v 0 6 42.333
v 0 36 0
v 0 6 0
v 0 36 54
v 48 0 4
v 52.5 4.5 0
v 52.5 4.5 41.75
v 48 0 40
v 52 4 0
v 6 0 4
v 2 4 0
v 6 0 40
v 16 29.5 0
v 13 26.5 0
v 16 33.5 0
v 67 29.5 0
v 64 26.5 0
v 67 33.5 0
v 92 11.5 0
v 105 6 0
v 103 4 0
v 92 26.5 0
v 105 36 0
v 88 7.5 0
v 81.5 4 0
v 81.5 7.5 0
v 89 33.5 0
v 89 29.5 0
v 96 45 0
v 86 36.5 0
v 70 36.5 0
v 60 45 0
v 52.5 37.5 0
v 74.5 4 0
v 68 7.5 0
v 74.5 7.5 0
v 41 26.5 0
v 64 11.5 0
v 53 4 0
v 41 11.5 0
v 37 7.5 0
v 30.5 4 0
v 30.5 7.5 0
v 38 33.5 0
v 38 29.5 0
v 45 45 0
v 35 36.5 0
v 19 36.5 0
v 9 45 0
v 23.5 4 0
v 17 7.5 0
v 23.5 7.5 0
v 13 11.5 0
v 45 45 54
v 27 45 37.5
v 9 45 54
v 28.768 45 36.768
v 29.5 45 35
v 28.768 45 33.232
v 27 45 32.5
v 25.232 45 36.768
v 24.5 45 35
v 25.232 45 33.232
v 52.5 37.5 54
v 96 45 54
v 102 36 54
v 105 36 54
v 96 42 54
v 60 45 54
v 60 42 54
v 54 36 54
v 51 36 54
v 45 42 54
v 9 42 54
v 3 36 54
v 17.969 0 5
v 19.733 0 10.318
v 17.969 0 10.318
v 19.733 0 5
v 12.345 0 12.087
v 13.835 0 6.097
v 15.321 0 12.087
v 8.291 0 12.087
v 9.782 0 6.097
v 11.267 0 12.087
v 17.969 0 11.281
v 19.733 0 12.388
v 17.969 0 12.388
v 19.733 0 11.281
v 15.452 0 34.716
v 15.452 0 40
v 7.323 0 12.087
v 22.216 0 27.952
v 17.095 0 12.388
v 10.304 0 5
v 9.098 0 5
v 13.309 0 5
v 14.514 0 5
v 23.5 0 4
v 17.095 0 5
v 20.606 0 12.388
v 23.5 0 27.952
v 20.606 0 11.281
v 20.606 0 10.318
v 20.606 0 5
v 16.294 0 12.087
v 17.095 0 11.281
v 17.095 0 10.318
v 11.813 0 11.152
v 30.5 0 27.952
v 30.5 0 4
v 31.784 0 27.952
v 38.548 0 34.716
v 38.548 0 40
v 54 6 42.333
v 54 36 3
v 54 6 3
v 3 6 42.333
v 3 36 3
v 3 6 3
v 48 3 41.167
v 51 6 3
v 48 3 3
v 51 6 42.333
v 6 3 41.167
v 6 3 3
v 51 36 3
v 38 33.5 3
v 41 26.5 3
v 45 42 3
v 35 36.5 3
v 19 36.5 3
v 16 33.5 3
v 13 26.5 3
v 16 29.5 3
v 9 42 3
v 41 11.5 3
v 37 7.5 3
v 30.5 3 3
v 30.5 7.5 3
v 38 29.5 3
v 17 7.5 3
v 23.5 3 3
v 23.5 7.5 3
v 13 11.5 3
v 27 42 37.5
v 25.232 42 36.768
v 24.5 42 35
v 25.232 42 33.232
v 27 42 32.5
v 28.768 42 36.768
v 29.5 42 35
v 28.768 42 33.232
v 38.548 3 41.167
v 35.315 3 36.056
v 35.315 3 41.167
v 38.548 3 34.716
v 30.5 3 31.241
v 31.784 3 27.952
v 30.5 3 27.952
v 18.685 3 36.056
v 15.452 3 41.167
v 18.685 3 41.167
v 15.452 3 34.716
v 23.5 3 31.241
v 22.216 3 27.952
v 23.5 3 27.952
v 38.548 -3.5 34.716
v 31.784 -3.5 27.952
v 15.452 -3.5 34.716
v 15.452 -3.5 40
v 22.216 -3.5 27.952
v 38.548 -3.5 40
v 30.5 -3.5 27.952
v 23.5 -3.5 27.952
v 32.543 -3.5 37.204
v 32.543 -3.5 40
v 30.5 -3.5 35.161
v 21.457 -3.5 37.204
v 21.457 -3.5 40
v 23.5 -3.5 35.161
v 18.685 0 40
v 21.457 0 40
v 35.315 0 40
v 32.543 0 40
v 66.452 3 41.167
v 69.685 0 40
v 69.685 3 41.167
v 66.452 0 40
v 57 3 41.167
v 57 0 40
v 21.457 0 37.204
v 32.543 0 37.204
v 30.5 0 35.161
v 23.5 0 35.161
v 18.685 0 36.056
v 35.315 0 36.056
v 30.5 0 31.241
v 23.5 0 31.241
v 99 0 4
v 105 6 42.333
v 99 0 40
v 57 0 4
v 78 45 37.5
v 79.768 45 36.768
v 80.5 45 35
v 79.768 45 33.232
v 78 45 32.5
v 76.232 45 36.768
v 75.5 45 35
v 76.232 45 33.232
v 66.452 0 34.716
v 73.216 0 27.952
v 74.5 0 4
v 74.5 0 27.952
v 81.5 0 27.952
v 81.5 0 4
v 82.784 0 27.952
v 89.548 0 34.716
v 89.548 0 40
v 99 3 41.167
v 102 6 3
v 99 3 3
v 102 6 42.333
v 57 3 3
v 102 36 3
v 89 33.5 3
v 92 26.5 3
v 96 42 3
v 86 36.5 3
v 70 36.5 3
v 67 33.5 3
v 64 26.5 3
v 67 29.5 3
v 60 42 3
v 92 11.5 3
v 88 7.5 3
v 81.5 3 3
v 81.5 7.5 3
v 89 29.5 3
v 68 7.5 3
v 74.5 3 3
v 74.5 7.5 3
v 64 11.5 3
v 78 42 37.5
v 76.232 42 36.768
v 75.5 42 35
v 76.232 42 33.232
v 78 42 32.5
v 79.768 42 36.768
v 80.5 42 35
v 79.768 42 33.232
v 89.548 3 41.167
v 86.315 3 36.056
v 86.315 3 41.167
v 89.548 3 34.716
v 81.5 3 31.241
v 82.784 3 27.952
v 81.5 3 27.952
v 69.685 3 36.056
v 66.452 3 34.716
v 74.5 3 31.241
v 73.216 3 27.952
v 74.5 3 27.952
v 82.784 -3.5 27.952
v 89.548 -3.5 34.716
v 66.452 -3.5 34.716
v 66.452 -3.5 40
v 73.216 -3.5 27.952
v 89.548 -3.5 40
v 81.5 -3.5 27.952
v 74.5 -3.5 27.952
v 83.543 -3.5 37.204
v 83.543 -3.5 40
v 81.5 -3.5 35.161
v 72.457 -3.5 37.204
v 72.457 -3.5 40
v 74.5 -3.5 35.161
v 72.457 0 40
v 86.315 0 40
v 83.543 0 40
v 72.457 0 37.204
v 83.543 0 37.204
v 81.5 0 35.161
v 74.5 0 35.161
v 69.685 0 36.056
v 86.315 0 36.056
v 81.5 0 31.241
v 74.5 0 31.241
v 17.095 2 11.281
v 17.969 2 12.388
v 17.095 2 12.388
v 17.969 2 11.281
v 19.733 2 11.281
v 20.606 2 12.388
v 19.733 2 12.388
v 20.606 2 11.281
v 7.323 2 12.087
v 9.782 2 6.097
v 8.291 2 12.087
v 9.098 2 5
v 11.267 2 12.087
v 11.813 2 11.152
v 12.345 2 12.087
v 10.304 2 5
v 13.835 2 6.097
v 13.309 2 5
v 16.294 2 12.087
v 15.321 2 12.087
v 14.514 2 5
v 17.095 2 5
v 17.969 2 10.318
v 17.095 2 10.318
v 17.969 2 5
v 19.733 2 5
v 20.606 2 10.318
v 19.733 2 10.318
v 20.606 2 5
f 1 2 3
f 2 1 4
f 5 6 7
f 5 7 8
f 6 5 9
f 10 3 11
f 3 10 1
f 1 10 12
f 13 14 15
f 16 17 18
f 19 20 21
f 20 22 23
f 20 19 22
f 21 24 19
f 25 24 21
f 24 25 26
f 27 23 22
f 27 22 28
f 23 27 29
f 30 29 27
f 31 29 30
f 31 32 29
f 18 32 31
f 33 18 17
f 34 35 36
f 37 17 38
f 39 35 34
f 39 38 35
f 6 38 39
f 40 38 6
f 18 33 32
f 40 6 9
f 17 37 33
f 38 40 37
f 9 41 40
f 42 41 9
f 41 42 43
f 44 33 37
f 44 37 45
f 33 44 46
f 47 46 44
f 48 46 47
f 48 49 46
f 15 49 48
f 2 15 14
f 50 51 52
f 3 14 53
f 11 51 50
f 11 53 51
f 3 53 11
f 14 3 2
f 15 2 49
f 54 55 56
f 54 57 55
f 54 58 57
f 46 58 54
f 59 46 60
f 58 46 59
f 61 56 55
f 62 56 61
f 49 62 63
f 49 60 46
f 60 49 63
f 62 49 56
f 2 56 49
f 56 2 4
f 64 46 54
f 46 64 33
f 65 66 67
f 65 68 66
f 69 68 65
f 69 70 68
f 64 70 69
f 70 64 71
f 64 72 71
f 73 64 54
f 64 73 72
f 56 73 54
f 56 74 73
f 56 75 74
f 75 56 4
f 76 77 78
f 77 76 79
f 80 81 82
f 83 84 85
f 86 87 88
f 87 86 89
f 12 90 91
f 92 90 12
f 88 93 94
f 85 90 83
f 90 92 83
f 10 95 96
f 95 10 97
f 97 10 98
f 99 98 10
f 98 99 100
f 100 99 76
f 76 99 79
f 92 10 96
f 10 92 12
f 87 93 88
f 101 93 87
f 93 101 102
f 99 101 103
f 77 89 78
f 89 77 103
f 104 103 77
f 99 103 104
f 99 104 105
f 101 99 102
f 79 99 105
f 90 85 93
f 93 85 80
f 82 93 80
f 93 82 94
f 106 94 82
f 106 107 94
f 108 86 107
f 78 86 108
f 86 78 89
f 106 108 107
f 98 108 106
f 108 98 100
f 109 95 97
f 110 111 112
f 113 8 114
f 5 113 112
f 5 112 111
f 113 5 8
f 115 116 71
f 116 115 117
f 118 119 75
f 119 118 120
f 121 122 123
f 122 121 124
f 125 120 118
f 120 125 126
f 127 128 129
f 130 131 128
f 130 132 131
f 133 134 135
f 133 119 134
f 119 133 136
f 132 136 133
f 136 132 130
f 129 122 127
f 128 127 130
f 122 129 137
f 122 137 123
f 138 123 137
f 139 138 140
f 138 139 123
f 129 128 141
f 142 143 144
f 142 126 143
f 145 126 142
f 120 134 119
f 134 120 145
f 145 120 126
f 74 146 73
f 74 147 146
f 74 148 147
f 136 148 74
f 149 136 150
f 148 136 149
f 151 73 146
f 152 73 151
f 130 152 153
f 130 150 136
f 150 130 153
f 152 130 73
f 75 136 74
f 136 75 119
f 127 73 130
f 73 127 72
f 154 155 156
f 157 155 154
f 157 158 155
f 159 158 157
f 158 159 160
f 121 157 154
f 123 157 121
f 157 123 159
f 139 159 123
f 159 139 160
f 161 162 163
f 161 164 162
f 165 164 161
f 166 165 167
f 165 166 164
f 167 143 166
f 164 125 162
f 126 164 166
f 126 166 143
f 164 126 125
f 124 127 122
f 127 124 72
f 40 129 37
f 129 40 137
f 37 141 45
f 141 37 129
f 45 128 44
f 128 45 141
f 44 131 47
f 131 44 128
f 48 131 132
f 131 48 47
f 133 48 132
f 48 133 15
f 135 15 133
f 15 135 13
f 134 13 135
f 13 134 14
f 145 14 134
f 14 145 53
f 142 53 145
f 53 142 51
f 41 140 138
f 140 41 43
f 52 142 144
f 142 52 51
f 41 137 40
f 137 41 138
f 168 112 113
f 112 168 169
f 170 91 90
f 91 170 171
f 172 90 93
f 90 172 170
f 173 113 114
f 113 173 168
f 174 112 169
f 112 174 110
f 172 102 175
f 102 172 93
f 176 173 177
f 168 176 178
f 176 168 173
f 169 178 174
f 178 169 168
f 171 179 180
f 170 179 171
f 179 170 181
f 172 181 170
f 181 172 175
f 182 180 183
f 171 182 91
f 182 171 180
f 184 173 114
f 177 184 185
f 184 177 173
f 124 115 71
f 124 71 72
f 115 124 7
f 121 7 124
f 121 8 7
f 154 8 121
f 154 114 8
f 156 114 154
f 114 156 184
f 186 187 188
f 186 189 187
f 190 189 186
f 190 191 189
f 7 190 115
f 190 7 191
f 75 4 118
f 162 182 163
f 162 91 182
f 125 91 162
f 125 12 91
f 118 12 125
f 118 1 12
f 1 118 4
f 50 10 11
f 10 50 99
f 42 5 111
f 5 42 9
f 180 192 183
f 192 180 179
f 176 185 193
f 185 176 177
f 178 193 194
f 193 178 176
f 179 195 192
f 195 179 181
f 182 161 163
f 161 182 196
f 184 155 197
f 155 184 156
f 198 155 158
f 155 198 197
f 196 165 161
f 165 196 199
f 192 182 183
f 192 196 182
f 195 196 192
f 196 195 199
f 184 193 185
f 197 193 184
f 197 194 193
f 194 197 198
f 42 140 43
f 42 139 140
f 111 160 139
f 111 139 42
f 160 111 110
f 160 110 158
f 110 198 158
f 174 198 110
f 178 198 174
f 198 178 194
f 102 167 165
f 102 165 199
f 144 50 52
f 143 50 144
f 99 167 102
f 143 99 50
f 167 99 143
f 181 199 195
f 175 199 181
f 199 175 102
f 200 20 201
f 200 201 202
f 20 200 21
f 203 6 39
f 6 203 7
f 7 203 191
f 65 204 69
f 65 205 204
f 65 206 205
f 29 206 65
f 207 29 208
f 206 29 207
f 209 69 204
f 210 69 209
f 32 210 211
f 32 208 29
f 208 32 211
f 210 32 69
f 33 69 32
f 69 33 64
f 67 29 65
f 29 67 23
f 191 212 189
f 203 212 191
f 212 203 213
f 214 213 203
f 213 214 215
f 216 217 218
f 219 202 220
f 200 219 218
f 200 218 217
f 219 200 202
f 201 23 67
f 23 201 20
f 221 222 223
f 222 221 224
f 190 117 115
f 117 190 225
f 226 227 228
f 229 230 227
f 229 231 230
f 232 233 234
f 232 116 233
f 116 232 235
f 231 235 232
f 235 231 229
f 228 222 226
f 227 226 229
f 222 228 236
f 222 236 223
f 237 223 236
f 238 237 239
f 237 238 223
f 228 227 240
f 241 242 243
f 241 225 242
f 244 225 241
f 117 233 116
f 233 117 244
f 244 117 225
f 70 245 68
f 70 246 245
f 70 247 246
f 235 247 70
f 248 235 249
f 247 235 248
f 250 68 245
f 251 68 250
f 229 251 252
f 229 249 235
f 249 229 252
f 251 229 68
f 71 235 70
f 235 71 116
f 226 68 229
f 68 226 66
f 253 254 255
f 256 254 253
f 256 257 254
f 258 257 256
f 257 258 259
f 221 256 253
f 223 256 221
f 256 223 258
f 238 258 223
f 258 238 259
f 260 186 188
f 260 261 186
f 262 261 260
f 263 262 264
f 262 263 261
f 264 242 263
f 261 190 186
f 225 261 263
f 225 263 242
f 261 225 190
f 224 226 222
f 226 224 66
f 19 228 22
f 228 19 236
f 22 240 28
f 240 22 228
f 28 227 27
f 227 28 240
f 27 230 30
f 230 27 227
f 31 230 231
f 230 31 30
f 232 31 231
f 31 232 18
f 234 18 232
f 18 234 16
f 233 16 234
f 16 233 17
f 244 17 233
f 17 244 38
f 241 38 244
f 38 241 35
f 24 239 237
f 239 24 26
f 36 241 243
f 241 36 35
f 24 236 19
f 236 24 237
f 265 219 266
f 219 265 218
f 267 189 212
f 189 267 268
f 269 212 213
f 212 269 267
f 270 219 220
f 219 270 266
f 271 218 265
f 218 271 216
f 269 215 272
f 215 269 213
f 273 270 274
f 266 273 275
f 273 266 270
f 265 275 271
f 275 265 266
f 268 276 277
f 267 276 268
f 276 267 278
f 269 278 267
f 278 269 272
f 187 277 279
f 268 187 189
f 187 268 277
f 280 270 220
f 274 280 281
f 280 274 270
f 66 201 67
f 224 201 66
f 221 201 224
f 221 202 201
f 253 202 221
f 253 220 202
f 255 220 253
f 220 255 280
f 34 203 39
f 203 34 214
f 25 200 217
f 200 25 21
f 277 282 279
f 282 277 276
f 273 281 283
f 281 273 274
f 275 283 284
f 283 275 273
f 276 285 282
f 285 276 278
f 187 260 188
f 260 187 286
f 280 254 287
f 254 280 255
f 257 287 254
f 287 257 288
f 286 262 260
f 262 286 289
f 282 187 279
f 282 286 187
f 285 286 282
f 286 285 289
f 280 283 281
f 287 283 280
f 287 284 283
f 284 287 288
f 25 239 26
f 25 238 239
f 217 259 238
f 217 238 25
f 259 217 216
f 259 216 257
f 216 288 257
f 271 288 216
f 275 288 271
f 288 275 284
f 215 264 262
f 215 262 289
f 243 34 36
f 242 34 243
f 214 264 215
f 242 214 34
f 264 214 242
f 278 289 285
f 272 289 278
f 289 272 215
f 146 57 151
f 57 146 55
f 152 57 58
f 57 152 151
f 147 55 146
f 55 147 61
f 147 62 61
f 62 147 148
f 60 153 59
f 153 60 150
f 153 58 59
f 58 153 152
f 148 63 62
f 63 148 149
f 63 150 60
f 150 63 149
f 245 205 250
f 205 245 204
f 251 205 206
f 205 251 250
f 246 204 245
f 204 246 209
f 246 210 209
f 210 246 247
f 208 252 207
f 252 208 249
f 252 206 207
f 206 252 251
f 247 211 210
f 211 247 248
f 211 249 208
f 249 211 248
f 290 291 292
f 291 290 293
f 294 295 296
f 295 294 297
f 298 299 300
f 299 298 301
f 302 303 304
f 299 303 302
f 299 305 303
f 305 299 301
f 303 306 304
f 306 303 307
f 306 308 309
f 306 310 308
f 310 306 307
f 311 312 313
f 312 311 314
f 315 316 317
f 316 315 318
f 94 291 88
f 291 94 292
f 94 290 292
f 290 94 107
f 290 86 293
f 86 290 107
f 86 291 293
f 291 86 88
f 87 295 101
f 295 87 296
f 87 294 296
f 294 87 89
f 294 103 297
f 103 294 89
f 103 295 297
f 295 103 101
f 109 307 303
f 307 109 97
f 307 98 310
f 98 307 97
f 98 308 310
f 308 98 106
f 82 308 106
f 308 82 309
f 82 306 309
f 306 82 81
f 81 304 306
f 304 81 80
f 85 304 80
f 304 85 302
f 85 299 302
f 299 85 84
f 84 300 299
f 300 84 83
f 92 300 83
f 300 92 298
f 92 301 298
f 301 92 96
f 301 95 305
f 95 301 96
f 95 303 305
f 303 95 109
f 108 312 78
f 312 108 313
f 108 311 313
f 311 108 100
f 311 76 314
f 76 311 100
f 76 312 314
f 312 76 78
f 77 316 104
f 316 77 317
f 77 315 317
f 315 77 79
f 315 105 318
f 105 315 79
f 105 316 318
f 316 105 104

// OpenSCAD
// number of bins
n = 2;

/* [Hidden] */

a = 6;
b = 9;
w = 48;
h = 39;
m = 3;
z = 54; 
 
outer_points =[[0,a], [0,h+2*m-b], [b,h+2*m], [w+2*m-b,h+2*m], [w+2*m,h+2*m-b], [w+2*m,a], [w+2*m-a,0], [a,0]];
inner_points =[[m,a], [m,h+2*m-b], [b,h+m], [w+2*m-b,h+m], [w+m,h+2*m-b], [w+m,a], [w+2*m-a,m], [a,m]];
hole_points = [[-10,0], [-14,4], [-14,19], [-11,22], [-11,26], [-8, 29], [8,29], [11,26], [11,22], [14,19], [14,4], [10,0]];
profile_points = [[0,0], [0, 54], [b, 54], [h+2*m, 40], [h+2*m+5, 40], [h+2*m+5, 4+5], [h+2*m-4, 0]]; 
 
 module wiimote()
 { 

       difference()
        {
            // main
            linear_extrude(height = z) 
               polygon(outer_points);    
            // cavity
            translate([0, 0, m])
                linear_extrude(heigth = m)
                    polygon(inner_points);    
            // cable hole
            translate([m+(w/2),6.5+1,0]) 
               linear_extrude(heigth =m)
                 polygon(hole_points);
        }
    
 }

module nunchuk_positive()
{
    // nunchuck holder
    translate([ m+(w/2), m, 39.5])
      rotate([90,360/16, 0])
        cylinder(h=6.5, d=25, $fn=8);
} 

module nunchuk_negative()
{
    // nunchuck holder
    translate([ m+(w/2), 1+m, 39.5])
      rotate([90,360/16, 0])
        {
            cylinder(h=6.5+1, d=11+1, $fn=8);
            cylinder(h=m+1, d=17+1, $fn=8);
        }

} 


module bin()
{
  difference()
  {
      intersection()
      {
         translate ([w+2*m, h + 2*m, 0]) 
           rotate([90, 0, -90])       
             linear_extrude(heigth = w + 2*m)
               polygon(profile_points); 
          union()
            {
                wiimote();
                nunchuk_positive();
            }
      }
        
  // front entrance
  translate([m+(w/2)-(7/2), -5, 0])
    cube([7, 6.5+5+1, z]);
  nunchuk_negative();
  }
}


difference()
{
  for (i = [1:n])
    translate([(i-1)*(w+m), 0, 0]) bin();
  // hanging holes
  translate([m+(w/2), h+2*m, 35]) rotate([90, 0, 0]) cylinder(h=2*m, d=5);
  translate([m+(w/2)+(n-1)*(w+m), h+2*m, 35]) rotate([90, 0, 0]) cylinder(h=2*m, d=5);
  # translate([7, 2, 5]) rotate([90, 0, 0])   linear_extrude(height = 2) text("Wii", font = "Arial Rounded MT Bold:style=Regular", size =7);
  }
